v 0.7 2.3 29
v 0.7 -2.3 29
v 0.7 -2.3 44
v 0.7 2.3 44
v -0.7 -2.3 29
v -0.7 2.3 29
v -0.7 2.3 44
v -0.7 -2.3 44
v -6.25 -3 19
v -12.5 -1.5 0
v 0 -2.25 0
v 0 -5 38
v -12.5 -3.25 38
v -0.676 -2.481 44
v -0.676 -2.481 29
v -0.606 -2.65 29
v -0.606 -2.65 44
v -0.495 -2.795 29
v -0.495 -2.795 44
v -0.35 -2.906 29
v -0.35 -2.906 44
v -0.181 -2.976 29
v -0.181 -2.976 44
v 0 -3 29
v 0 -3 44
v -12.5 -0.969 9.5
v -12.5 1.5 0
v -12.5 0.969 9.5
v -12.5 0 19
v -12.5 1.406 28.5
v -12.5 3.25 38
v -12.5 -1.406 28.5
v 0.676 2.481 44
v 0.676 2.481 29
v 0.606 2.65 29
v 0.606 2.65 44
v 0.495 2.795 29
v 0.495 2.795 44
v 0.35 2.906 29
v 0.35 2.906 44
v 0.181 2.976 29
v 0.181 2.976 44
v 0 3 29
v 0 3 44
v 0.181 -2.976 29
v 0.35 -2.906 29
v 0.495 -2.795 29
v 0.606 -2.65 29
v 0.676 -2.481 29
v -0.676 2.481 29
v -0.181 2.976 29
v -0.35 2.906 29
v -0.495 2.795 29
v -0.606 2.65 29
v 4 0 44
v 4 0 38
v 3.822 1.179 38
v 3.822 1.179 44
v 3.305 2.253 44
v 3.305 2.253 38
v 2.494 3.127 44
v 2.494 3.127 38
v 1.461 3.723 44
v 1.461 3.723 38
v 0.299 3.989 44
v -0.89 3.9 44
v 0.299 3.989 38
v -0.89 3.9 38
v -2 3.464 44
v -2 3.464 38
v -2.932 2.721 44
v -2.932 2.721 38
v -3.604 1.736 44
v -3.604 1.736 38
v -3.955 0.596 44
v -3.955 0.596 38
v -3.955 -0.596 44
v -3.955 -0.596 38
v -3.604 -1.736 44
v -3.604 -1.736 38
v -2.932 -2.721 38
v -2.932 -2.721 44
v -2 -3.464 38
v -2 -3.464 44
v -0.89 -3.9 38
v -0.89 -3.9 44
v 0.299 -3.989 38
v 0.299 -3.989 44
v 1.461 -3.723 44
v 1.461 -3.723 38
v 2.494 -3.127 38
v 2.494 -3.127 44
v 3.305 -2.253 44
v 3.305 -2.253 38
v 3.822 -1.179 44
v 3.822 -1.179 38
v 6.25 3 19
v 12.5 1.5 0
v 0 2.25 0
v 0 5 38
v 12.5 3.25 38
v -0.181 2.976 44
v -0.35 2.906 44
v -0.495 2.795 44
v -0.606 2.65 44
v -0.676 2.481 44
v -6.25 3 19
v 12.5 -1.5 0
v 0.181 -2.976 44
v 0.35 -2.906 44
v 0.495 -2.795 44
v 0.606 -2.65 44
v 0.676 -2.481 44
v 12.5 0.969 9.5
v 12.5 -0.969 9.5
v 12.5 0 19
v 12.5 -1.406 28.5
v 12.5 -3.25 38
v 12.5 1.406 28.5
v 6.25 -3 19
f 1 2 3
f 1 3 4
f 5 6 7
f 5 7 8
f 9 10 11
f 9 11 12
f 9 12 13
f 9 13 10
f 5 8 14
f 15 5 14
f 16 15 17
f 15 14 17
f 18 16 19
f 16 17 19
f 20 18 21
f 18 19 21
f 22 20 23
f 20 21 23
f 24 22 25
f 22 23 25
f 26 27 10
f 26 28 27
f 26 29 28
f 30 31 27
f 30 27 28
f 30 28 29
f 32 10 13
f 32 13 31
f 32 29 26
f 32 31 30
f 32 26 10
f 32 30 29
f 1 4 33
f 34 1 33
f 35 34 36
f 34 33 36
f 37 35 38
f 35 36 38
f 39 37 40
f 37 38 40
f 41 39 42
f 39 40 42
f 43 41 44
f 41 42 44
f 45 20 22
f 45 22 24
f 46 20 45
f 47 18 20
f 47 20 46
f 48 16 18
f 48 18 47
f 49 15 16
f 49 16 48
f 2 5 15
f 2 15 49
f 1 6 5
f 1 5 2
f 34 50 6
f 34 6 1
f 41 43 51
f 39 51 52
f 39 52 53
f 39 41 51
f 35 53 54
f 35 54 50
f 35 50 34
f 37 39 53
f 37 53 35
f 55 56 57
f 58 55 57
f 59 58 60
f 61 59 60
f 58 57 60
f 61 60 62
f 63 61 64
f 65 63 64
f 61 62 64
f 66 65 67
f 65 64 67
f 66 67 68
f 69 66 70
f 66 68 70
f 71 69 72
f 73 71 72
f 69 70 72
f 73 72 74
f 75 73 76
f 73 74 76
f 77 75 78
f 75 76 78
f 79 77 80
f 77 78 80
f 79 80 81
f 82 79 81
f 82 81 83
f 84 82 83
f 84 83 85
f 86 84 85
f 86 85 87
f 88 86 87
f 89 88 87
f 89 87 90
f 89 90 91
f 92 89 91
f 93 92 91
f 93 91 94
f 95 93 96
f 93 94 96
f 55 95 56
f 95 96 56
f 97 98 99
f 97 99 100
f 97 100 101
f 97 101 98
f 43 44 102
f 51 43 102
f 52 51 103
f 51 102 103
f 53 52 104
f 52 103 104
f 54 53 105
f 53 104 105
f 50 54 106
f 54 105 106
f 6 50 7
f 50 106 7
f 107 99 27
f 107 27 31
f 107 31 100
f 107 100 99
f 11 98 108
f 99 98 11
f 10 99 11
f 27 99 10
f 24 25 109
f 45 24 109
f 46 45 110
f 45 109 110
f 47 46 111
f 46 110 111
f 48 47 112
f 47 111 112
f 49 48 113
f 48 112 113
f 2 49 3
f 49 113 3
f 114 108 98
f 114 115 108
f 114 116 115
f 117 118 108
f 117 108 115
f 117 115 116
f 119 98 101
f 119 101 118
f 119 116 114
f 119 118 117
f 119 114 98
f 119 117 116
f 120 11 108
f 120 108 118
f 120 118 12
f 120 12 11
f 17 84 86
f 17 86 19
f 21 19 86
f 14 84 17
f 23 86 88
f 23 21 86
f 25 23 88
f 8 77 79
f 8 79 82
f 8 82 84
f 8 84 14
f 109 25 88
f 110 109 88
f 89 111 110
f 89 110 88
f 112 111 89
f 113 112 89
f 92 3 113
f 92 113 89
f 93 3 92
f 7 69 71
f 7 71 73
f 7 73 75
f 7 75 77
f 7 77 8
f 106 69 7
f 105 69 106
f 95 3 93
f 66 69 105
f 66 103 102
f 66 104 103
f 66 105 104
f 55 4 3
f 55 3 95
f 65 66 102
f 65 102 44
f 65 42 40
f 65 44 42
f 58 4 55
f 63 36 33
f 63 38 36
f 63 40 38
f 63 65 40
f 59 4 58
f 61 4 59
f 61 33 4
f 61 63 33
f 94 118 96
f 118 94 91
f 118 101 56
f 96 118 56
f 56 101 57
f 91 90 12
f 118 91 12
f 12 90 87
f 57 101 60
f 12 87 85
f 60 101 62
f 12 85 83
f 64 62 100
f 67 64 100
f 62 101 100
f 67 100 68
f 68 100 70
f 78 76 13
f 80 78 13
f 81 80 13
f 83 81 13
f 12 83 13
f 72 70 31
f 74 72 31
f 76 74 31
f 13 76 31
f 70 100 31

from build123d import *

# Parameters (mm, degrees)
F4_R     = 4
F5_DEPTH = 6
F7_DEPTH = 15


with BuildPart() as f3:
    # F0 (on Top) → F3 section 0
    with BuildSketch(Plane.XY):
        Polygon((12.5, 1.5), (0, 2.25), (-12.5, 1.5), (-12.5, 0), (-12.5, -1.5), (0, -2.25), (12.5, -1.5), (12.5, 0), align=None)
    # F2 (on offset) → F3 section 1
    with BuildSketch(Plane.XY.offset(38)):
        Polygon((-12.5, 3.25), (-12.5, 0), (-12.5, -3.25), (0, -5), (12.5, -3.25), (12.5, 0), (12.5, 3.25), (0, 5), align=None)
    loft()

    # F4 (on face) → F5 (join)
    with BuildSketch(Plane.XY.offset(38)):
        Circle(F4_R)
    extrude(amount=F5_DEPTH)

    # F6 (on face) → F7 (cut)
    with BuildSketch(Plane.XY.offset(44)):
        with BuildLine():
            Line((-0.7, 2.3), (-0.7, 0))
            Line((-0.7, 0), (-0.7, -2.3))
            ThreePointArc((-0.7, -2.3), (-0.4949747468, -2.7949747468), (0, -3))
            ThreePointArc((0, -3), (0.4949747468, -2.7949747468), (0.7, -2.3))
            Line((0.7, -2.3), (0.7, 0))
            Line((0.7, 0), (0.7, 2.3))
            ThreePointArc((0.7, 2.3), (0.4949747468, 2.7949747468), (0, 3))
            ThreePointArc((0, 3), (-0.4949747468, 2.7949747468), (-0.7, 2.3))
        make_face()
    extrude(amount=-F7_DEPTH, mode=Mode.SUBTRACT)


solid = f3.part
